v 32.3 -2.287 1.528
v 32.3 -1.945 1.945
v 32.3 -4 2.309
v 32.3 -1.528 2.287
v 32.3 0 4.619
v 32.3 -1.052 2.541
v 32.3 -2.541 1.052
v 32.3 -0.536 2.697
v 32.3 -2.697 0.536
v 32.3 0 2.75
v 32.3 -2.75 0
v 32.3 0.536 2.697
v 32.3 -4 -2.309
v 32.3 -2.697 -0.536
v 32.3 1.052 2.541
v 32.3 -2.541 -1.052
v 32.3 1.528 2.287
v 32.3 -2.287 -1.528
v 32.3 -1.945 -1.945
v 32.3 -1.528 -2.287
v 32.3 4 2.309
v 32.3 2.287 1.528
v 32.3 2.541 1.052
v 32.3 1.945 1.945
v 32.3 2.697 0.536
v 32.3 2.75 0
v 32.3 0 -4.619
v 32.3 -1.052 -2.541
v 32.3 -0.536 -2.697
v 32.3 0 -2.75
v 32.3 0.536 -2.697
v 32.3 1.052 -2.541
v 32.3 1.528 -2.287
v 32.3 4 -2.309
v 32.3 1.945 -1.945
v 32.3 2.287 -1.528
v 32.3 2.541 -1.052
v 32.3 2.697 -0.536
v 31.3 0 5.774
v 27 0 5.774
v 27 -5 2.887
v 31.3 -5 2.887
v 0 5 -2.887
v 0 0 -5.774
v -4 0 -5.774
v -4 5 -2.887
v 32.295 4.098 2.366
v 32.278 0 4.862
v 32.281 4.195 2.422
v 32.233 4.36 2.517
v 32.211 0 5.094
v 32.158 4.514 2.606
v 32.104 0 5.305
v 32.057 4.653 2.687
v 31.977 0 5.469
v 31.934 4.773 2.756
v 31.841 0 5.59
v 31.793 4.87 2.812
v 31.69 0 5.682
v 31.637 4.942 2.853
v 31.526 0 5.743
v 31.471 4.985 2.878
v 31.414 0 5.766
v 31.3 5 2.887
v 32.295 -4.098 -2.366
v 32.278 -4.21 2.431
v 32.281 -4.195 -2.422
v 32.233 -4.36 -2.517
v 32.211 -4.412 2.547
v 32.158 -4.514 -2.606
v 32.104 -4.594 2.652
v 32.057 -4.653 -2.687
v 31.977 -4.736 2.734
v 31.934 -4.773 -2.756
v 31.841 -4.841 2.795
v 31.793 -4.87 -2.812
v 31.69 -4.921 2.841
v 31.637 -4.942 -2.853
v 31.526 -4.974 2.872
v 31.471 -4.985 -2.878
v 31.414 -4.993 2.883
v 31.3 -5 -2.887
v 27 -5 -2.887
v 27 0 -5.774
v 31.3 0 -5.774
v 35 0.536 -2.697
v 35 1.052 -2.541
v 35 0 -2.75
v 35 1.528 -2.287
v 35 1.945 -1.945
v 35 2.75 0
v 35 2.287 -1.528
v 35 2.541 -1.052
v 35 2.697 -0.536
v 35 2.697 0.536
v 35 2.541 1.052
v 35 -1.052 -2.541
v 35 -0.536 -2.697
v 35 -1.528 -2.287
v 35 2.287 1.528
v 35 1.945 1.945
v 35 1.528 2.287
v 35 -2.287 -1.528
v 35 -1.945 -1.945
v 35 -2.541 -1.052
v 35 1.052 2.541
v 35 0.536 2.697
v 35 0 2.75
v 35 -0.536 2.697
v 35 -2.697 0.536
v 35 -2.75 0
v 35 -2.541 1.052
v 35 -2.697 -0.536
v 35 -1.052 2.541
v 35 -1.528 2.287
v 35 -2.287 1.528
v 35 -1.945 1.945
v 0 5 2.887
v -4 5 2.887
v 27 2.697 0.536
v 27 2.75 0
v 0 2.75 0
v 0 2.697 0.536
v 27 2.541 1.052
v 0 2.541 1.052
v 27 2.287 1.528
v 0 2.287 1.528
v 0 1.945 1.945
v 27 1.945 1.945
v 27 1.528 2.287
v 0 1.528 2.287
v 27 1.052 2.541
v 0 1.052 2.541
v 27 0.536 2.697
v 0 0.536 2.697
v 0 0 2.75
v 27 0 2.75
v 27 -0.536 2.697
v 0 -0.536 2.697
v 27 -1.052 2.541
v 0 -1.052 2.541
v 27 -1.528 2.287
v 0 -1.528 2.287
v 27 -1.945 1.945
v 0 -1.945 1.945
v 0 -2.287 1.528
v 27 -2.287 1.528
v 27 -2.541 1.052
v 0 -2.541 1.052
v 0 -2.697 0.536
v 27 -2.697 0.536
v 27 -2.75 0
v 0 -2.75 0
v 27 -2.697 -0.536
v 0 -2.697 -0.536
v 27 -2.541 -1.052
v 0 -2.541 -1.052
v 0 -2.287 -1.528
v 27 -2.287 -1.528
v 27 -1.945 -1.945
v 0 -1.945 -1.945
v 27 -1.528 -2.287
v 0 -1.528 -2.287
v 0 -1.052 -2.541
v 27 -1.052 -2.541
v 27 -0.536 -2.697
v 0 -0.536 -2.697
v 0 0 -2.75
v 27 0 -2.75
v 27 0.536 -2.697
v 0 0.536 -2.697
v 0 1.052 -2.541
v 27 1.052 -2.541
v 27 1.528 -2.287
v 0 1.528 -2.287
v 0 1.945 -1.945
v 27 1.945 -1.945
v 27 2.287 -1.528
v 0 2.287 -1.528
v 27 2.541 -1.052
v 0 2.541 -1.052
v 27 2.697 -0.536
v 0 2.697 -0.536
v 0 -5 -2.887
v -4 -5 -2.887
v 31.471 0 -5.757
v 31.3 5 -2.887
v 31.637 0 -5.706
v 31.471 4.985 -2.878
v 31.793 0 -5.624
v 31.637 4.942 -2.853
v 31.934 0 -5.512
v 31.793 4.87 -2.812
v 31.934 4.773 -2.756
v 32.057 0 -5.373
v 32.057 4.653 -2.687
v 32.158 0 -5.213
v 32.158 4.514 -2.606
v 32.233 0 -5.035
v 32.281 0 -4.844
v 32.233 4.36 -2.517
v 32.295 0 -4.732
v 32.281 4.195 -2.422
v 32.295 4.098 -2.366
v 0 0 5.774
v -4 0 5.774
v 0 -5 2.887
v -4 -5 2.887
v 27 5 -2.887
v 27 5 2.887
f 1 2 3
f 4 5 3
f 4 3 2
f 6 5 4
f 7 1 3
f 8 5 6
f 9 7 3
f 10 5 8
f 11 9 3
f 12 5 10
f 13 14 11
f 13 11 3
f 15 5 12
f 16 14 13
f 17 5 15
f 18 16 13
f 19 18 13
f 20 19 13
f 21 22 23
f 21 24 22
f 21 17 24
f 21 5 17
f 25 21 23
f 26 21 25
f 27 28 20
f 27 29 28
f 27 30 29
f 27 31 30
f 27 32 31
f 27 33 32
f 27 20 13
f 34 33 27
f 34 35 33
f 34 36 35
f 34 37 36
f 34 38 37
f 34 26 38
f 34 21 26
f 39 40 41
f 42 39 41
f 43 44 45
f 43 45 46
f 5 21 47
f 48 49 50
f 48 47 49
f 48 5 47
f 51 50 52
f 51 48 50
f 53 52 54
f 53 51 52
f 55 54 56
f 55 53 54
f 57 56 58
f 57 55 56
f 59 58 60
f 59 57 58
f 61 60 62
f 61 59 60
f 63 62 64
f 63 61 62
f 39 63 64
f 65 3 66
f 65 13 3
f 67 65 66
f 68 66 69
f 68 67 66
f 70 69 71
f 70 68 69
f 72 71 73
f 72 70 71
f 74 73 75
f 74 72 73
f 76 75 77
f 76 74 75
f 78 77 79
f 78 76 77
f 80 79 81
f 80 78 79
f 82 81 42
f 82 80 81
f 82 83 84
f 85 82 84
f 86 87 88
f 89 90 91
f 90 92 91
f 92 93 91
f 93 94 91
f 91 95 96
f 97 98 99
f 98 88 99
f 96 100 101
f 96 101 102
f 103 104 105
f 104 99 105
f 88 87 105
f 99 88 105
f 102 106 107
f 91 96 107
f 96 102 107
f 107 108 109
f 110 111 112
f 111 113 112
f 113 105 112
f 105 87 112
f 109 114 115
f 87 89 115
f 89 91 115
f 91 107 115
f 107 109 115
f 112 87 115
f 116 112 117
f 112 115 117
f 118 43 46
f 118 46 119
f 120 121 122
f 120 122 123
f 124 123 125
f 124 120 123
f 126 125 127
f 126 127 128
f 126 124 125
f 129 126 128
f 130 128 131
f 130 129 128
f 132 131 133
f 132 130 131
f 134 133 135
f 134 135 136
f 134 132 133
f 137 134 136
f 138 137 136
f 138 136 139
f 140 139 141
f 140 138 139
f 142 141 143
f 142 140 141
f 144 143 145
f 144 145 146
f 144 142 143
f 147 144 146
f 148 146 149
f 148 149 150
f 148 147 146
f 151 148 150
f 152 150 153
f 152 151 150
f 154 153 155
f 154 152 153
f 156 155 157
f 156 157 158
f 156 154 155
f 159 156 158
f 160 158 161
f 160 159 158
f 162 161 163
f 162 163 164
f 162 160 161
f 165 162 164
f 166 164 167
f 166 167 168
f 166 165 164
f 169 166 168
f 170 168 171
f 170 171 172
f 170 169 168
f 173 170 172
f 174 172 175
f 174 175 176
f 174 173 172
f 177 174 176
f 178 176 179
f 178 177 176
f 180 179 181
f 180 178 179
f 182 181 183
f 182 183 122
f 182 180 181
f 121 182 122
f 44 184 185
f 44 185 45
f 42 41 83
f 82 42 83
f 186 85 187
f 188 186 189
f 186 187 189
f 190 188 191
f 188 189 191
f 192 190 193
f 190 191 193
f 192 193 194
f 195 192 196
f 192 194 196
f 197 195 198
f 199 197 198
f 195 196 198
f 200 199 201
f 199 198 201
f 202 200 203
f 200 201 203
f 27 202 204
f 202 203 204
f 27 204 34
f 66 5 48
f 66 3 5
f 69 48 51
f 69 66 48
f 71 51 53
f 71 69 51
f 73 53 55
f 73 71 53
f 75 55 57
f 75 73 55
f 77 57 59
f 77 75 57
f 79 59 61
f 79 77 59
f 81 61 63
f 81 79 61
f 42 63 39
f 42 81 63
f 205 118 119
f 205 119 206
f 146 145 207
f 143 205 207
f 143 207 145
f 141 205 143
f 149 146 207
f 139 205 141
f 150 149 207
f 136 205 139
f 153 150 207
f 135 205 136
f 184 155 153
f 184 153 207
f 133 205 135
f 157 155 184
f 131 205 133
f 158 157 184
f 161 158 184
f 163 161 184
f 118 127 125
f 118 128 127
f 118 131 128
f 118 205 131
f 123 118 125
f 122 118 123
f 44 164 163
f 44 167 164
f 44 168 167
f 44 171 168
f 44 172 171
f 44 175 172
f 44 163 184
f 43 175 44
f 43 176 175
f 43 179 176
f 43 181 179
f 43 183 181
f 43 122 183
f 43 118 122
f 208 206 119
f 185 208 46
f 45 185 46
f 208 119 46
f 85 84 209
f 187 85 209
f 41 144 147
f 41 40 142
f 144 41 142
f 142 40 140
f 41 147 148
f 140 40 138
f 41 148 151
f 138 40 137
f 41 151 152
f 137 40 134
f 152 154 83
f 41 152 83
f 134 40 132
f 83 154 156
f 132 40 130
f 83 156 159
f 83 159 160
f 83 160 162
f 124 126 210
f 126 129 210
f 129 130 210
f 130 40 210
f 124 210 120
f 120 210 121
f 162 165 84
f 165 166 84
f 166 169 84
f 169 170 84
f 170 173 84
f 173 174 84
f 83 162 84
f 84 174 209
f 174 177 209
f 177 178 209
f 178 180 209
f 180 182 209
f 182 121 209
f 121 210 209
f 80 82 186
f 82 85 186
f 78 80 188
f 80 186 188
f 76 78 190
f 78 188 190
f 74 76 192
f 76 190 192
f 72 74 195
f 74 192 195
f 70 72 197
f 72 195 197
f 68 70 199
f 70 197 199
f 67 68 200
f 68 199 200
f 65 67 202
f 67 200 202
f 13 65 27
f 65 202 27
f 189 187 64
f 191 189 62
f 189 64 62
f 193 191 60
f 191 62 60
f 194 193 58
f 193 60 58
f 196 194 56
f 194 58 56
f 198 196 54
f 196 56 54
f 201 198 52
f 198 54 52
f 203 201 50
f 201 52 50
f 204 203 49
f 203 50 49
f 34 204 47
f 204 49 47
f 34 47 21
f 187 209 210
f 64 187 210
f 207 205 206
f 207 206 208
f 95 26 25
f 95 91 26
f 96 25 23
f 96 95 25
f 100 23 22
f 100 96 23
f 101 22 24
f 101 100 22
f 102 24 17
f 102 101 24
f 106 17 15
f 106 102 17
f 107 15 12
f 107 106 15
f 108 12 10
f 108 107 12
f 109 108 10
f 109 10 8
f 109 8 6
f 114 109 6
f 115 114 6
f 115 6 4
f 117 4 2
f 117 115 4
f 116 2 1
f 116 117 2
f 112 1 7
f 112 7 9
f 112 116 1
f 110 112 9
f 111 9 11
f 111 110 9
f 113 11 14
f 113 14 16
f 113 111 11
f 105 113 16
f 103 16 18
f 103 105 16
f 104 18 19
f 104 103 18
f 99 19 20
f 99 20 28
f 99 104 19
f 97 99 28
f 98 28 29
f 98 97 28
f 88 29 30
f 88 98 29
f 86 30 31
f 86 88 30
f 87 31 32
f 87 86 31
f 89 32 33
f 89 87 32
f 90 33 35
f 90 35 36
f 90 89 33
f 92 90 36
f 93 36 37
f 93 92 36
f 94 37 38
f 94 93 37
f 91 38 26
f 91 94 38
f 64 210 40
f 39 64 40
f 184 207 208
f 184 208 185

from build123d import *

# Parameters (mm, degrees)
SKETCH1_W           = 35
SKETCH1_H           = 2.75
BOSS_EXTRUDE1_DEPTH = 4
BOSS_EXTRUDE2_DEPTH = 5.3
FILLET1_R           = 1


with BuildPart() as part:
    # Sketch1 → Revolve1 (revolve)
    with BuildSketch(Plane.XY):
        with Locations((17.5, 1.375)):
            Rectangle(SKETCH1_W, SKETCH1_H)
    revolve(axis=Axis((0, 0, 0), (1, 0, 0)))

    # Sketch2 → Boss-Extrude1 (add)
    with BuildSketch(Plane(origin=(0, 0, 0), x_dir=(0, 0, -1), z_dir=(1, 0, 0))):
        Polygon((5.773502692, 0), (2.886751346, 5), (-2.886751346, 5), (-5.773502692, 0), (-2.886751346, -5), (2.886751346, -5), align=None)
    extrude(amount=-BOSS_EXTRUDE1_DEPTH)

    # Sketch3 → Boss-Extrude2 (add)
    with BuildSketch(Plane(origin=(27, 0, 0), x_dir=(0, 0, -1), z_dir=(1, 0, 0))):
        Polygon((5.773502692, 0), (2.886751346, 5), (-2.886751346, 5), (-5.773502692, 0), (-2.886751346, -5), (2.886751346, -5), align=None)
    extrude(amount=BOSS_EXTRUDE2_DEPTH)

    # Fillet1
    fillet1_edges = [part.edges().sort_by_distance(p)[0] for p in [
        (32.3, -2.5, -4.330127019),
        (32.3, 2.5, -4.330127019),
        (32.3, 5, 0),
        (32.3, 2.5, 4.330127019),
        (32.3, -2.5, 4.330127019),
        (32.3, -5, 0),
    ]]
    fillet(fillet1_edges, radius=FILLET1_R)


solid = part.part
